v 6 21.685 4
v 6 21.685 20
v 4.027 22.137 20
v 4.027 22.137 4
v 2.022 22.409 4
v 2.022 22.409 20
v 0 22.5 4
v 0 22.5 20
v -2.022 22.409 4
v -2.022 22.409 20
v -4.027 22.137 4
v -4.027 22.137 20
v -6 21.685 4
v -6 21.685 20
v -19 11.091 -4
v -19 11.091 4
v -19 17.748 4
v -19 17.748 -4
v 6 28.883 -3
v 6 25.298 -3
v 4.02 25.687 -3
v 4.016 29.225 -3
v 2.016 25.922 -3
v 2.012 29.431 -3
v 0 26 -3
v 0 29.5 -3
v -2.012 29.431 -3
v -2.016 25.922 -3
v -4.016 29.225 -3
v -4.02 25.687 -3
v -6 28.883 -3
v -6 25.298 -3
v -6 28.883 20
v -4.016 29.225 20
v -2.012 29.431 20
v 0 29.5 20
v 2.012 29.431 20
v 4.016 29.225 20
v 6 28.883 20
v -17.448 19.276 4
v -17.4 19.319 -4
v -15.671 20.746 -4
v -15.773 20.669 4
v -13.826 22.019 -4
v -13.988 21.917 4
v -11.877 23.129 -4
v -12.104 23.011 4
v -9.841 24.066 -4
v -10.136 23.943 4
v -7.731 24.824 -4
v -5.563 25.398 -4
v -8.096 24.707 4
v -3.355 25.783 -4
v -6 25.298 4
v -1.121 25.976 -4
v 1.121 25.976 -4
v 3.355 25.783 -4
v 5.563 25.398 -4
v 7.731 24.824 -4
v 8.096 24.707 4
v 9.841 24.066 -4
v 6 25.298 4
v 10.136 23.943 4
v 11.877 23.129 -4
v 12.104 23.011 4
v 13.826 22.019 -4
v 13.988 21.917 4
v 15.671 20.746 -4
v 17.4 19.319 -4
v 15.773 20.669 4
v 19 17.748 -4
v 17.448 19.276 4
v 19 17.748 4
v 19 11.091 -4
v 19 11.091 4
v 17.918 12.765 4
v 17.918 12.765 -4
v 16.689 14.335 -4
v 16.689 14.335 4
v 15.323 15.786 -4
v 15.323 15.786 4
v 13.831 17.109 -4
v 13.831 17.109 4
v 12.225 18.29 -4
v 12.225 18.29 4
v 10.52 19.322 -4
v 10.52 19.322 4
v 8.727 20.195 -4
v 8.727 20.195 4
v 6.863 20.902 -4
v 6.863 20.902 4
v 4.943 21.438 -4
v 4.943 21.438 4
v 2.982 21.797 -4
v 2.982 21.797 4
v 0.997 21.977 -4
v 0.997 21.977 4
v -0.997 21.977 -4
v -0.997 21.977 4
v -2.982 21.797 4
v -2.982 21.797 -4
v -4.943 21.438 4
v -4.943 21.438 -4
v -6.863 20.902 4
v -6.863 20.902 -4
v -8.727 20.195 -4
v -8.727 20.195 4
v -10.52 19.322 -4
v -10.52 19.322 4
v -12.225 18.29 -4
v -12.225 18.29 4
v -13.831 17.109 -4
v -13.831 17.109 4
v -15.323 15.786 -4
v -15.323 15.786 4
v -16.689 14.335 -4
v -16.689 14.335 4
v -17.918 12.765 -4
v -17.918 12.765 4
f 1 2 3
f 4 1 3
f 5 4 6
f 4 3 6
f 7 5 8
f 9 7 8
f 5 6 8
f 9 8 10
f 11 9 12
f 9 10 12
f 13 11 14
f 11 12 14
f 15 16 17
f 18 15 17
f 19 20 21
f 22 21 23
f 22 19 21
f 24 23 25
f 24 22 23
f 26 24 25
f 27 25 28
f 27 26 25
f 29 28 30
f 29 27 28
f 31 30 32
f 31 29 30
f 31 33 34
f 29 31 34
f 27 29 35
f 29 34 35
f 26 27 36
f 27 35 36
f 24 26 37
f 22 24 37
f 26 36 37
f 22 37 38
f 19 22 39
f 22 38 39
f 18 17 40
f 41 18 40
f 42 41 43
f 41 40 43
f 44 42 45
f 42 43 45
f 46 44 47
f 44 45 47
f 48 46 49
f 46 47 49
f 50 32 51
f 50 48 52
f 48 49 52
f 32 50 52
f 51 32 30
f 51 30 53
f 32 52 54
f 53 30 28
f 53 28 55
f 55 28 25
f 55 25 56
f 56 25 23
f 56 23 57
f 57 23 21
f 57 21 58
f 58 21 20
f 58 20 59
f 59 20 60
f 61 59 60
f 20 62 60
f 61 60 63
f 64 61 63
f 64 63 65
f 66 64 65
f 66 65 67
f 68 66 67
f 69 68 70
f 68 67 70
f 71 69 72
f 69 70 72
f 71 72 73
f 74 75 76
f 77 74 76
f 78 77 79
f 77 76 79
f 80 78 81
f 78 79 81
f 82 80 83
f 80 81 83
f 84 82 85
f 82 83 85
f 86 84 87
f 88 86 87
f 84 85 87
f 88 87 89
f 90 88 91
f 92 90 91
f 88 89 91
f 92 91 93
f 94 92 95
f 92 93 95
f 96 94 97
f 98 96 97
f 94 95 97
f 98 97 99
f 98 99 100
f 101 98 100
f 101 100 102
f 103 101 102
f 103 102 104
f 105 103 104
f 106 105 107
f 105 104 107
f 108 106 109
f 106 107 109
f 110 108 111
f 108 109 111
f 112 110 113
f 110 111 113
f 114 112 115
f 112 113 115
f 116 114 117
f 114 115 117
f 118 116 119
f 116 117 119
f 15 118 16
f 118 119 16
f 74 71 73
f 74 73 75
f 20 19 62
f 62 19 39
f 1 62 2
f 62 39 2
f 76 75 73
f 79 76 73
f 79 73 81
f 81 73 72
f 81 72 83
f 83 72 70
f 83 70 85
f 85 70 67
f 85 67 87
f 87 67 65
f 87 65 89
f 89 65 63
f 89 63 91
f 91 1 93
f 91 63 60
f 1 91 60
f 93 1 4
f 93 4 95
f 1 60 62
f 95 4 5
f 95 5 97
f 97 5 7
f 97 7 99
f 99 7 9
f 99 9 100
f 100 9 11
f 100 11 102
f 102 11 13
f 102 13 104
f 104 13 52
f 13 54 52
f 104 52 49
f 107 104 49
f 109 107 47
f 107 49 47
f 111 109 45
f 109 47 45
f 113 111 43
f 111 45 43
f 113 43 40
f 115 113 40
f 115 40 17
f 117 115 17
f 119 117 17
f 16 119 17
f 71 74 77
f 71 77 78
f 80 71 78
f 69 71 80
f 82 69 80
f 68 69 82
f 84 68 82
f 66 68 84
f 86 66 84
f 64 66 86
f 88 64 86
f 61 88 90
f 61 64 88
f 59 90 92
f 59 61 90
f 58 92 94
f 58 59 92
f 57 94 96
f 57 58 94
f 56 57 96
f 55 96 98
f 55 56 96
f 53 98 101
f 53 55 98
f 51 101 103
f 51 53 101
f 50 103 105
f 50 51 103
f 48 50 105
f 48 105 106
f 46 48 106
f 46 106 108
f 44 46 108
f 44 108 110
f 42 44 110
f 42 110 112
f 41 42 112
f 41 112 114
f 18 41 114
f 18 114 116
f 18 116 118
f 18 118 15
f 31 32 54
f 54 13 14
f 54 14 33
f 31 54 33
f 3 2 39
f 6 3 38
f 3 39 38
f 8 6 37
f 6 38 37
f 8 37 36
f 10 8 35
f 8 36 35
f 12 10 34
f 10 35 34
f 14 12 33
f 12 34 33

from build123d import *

# Parameters (mm, degrees)
EXTRUDE1_DEPTH      = 4
EXTRUDE2_DEPTH      = 7
EXTRUDE2_DEPTH_BACK = 16


with BuildPart() as part:
    # Sketch1 → Extrude1 (new, symmetric)
    with BuildSketch(Plane.XY):
        with BuildLine():
            Line((-19, 11.090536506), (-19, 17.748239349))
            ThreePointArc((-19, 17.748239349), (0, 26), (19, 17.748239349))
            Line((19, 17.748239349), (19, 11.090536506))
            ThreePointArc((19, 11.090536506), (0, 22), (-19, 11.090536506))
        make_face()
    extrude(amount=EXTRUDE1_DEPTH, both=True)

    # Sketch2 → Extrude2 (add, two sides: drawn at the far end of the back side and taken through both)
    with BuildSketch(Plane(origin=(0, 0, 4), x_dir=(-1, 0, 0), z_dir=(0, 0, -1)).offset(-EXTRUDE2_DEPTH_BACK)):
        with BuildLine():
            Line((6, 21.685248442), (6, 28.883386228))
            ThreePointArc((6, 28.883386228), (0, 29.5), (-6, 28.883386228))
            Line((-6, 28.883386228), (-6, 21.685248442))
            ThreePointArc((-6, 21.685248442), (0, 22.5), (6, 21.685248442))
        make_face()
    extrude(amount=EXTRUDE2_DEPTH + EXTRUDE2_DEPTH_BACK)


solid = part.part
